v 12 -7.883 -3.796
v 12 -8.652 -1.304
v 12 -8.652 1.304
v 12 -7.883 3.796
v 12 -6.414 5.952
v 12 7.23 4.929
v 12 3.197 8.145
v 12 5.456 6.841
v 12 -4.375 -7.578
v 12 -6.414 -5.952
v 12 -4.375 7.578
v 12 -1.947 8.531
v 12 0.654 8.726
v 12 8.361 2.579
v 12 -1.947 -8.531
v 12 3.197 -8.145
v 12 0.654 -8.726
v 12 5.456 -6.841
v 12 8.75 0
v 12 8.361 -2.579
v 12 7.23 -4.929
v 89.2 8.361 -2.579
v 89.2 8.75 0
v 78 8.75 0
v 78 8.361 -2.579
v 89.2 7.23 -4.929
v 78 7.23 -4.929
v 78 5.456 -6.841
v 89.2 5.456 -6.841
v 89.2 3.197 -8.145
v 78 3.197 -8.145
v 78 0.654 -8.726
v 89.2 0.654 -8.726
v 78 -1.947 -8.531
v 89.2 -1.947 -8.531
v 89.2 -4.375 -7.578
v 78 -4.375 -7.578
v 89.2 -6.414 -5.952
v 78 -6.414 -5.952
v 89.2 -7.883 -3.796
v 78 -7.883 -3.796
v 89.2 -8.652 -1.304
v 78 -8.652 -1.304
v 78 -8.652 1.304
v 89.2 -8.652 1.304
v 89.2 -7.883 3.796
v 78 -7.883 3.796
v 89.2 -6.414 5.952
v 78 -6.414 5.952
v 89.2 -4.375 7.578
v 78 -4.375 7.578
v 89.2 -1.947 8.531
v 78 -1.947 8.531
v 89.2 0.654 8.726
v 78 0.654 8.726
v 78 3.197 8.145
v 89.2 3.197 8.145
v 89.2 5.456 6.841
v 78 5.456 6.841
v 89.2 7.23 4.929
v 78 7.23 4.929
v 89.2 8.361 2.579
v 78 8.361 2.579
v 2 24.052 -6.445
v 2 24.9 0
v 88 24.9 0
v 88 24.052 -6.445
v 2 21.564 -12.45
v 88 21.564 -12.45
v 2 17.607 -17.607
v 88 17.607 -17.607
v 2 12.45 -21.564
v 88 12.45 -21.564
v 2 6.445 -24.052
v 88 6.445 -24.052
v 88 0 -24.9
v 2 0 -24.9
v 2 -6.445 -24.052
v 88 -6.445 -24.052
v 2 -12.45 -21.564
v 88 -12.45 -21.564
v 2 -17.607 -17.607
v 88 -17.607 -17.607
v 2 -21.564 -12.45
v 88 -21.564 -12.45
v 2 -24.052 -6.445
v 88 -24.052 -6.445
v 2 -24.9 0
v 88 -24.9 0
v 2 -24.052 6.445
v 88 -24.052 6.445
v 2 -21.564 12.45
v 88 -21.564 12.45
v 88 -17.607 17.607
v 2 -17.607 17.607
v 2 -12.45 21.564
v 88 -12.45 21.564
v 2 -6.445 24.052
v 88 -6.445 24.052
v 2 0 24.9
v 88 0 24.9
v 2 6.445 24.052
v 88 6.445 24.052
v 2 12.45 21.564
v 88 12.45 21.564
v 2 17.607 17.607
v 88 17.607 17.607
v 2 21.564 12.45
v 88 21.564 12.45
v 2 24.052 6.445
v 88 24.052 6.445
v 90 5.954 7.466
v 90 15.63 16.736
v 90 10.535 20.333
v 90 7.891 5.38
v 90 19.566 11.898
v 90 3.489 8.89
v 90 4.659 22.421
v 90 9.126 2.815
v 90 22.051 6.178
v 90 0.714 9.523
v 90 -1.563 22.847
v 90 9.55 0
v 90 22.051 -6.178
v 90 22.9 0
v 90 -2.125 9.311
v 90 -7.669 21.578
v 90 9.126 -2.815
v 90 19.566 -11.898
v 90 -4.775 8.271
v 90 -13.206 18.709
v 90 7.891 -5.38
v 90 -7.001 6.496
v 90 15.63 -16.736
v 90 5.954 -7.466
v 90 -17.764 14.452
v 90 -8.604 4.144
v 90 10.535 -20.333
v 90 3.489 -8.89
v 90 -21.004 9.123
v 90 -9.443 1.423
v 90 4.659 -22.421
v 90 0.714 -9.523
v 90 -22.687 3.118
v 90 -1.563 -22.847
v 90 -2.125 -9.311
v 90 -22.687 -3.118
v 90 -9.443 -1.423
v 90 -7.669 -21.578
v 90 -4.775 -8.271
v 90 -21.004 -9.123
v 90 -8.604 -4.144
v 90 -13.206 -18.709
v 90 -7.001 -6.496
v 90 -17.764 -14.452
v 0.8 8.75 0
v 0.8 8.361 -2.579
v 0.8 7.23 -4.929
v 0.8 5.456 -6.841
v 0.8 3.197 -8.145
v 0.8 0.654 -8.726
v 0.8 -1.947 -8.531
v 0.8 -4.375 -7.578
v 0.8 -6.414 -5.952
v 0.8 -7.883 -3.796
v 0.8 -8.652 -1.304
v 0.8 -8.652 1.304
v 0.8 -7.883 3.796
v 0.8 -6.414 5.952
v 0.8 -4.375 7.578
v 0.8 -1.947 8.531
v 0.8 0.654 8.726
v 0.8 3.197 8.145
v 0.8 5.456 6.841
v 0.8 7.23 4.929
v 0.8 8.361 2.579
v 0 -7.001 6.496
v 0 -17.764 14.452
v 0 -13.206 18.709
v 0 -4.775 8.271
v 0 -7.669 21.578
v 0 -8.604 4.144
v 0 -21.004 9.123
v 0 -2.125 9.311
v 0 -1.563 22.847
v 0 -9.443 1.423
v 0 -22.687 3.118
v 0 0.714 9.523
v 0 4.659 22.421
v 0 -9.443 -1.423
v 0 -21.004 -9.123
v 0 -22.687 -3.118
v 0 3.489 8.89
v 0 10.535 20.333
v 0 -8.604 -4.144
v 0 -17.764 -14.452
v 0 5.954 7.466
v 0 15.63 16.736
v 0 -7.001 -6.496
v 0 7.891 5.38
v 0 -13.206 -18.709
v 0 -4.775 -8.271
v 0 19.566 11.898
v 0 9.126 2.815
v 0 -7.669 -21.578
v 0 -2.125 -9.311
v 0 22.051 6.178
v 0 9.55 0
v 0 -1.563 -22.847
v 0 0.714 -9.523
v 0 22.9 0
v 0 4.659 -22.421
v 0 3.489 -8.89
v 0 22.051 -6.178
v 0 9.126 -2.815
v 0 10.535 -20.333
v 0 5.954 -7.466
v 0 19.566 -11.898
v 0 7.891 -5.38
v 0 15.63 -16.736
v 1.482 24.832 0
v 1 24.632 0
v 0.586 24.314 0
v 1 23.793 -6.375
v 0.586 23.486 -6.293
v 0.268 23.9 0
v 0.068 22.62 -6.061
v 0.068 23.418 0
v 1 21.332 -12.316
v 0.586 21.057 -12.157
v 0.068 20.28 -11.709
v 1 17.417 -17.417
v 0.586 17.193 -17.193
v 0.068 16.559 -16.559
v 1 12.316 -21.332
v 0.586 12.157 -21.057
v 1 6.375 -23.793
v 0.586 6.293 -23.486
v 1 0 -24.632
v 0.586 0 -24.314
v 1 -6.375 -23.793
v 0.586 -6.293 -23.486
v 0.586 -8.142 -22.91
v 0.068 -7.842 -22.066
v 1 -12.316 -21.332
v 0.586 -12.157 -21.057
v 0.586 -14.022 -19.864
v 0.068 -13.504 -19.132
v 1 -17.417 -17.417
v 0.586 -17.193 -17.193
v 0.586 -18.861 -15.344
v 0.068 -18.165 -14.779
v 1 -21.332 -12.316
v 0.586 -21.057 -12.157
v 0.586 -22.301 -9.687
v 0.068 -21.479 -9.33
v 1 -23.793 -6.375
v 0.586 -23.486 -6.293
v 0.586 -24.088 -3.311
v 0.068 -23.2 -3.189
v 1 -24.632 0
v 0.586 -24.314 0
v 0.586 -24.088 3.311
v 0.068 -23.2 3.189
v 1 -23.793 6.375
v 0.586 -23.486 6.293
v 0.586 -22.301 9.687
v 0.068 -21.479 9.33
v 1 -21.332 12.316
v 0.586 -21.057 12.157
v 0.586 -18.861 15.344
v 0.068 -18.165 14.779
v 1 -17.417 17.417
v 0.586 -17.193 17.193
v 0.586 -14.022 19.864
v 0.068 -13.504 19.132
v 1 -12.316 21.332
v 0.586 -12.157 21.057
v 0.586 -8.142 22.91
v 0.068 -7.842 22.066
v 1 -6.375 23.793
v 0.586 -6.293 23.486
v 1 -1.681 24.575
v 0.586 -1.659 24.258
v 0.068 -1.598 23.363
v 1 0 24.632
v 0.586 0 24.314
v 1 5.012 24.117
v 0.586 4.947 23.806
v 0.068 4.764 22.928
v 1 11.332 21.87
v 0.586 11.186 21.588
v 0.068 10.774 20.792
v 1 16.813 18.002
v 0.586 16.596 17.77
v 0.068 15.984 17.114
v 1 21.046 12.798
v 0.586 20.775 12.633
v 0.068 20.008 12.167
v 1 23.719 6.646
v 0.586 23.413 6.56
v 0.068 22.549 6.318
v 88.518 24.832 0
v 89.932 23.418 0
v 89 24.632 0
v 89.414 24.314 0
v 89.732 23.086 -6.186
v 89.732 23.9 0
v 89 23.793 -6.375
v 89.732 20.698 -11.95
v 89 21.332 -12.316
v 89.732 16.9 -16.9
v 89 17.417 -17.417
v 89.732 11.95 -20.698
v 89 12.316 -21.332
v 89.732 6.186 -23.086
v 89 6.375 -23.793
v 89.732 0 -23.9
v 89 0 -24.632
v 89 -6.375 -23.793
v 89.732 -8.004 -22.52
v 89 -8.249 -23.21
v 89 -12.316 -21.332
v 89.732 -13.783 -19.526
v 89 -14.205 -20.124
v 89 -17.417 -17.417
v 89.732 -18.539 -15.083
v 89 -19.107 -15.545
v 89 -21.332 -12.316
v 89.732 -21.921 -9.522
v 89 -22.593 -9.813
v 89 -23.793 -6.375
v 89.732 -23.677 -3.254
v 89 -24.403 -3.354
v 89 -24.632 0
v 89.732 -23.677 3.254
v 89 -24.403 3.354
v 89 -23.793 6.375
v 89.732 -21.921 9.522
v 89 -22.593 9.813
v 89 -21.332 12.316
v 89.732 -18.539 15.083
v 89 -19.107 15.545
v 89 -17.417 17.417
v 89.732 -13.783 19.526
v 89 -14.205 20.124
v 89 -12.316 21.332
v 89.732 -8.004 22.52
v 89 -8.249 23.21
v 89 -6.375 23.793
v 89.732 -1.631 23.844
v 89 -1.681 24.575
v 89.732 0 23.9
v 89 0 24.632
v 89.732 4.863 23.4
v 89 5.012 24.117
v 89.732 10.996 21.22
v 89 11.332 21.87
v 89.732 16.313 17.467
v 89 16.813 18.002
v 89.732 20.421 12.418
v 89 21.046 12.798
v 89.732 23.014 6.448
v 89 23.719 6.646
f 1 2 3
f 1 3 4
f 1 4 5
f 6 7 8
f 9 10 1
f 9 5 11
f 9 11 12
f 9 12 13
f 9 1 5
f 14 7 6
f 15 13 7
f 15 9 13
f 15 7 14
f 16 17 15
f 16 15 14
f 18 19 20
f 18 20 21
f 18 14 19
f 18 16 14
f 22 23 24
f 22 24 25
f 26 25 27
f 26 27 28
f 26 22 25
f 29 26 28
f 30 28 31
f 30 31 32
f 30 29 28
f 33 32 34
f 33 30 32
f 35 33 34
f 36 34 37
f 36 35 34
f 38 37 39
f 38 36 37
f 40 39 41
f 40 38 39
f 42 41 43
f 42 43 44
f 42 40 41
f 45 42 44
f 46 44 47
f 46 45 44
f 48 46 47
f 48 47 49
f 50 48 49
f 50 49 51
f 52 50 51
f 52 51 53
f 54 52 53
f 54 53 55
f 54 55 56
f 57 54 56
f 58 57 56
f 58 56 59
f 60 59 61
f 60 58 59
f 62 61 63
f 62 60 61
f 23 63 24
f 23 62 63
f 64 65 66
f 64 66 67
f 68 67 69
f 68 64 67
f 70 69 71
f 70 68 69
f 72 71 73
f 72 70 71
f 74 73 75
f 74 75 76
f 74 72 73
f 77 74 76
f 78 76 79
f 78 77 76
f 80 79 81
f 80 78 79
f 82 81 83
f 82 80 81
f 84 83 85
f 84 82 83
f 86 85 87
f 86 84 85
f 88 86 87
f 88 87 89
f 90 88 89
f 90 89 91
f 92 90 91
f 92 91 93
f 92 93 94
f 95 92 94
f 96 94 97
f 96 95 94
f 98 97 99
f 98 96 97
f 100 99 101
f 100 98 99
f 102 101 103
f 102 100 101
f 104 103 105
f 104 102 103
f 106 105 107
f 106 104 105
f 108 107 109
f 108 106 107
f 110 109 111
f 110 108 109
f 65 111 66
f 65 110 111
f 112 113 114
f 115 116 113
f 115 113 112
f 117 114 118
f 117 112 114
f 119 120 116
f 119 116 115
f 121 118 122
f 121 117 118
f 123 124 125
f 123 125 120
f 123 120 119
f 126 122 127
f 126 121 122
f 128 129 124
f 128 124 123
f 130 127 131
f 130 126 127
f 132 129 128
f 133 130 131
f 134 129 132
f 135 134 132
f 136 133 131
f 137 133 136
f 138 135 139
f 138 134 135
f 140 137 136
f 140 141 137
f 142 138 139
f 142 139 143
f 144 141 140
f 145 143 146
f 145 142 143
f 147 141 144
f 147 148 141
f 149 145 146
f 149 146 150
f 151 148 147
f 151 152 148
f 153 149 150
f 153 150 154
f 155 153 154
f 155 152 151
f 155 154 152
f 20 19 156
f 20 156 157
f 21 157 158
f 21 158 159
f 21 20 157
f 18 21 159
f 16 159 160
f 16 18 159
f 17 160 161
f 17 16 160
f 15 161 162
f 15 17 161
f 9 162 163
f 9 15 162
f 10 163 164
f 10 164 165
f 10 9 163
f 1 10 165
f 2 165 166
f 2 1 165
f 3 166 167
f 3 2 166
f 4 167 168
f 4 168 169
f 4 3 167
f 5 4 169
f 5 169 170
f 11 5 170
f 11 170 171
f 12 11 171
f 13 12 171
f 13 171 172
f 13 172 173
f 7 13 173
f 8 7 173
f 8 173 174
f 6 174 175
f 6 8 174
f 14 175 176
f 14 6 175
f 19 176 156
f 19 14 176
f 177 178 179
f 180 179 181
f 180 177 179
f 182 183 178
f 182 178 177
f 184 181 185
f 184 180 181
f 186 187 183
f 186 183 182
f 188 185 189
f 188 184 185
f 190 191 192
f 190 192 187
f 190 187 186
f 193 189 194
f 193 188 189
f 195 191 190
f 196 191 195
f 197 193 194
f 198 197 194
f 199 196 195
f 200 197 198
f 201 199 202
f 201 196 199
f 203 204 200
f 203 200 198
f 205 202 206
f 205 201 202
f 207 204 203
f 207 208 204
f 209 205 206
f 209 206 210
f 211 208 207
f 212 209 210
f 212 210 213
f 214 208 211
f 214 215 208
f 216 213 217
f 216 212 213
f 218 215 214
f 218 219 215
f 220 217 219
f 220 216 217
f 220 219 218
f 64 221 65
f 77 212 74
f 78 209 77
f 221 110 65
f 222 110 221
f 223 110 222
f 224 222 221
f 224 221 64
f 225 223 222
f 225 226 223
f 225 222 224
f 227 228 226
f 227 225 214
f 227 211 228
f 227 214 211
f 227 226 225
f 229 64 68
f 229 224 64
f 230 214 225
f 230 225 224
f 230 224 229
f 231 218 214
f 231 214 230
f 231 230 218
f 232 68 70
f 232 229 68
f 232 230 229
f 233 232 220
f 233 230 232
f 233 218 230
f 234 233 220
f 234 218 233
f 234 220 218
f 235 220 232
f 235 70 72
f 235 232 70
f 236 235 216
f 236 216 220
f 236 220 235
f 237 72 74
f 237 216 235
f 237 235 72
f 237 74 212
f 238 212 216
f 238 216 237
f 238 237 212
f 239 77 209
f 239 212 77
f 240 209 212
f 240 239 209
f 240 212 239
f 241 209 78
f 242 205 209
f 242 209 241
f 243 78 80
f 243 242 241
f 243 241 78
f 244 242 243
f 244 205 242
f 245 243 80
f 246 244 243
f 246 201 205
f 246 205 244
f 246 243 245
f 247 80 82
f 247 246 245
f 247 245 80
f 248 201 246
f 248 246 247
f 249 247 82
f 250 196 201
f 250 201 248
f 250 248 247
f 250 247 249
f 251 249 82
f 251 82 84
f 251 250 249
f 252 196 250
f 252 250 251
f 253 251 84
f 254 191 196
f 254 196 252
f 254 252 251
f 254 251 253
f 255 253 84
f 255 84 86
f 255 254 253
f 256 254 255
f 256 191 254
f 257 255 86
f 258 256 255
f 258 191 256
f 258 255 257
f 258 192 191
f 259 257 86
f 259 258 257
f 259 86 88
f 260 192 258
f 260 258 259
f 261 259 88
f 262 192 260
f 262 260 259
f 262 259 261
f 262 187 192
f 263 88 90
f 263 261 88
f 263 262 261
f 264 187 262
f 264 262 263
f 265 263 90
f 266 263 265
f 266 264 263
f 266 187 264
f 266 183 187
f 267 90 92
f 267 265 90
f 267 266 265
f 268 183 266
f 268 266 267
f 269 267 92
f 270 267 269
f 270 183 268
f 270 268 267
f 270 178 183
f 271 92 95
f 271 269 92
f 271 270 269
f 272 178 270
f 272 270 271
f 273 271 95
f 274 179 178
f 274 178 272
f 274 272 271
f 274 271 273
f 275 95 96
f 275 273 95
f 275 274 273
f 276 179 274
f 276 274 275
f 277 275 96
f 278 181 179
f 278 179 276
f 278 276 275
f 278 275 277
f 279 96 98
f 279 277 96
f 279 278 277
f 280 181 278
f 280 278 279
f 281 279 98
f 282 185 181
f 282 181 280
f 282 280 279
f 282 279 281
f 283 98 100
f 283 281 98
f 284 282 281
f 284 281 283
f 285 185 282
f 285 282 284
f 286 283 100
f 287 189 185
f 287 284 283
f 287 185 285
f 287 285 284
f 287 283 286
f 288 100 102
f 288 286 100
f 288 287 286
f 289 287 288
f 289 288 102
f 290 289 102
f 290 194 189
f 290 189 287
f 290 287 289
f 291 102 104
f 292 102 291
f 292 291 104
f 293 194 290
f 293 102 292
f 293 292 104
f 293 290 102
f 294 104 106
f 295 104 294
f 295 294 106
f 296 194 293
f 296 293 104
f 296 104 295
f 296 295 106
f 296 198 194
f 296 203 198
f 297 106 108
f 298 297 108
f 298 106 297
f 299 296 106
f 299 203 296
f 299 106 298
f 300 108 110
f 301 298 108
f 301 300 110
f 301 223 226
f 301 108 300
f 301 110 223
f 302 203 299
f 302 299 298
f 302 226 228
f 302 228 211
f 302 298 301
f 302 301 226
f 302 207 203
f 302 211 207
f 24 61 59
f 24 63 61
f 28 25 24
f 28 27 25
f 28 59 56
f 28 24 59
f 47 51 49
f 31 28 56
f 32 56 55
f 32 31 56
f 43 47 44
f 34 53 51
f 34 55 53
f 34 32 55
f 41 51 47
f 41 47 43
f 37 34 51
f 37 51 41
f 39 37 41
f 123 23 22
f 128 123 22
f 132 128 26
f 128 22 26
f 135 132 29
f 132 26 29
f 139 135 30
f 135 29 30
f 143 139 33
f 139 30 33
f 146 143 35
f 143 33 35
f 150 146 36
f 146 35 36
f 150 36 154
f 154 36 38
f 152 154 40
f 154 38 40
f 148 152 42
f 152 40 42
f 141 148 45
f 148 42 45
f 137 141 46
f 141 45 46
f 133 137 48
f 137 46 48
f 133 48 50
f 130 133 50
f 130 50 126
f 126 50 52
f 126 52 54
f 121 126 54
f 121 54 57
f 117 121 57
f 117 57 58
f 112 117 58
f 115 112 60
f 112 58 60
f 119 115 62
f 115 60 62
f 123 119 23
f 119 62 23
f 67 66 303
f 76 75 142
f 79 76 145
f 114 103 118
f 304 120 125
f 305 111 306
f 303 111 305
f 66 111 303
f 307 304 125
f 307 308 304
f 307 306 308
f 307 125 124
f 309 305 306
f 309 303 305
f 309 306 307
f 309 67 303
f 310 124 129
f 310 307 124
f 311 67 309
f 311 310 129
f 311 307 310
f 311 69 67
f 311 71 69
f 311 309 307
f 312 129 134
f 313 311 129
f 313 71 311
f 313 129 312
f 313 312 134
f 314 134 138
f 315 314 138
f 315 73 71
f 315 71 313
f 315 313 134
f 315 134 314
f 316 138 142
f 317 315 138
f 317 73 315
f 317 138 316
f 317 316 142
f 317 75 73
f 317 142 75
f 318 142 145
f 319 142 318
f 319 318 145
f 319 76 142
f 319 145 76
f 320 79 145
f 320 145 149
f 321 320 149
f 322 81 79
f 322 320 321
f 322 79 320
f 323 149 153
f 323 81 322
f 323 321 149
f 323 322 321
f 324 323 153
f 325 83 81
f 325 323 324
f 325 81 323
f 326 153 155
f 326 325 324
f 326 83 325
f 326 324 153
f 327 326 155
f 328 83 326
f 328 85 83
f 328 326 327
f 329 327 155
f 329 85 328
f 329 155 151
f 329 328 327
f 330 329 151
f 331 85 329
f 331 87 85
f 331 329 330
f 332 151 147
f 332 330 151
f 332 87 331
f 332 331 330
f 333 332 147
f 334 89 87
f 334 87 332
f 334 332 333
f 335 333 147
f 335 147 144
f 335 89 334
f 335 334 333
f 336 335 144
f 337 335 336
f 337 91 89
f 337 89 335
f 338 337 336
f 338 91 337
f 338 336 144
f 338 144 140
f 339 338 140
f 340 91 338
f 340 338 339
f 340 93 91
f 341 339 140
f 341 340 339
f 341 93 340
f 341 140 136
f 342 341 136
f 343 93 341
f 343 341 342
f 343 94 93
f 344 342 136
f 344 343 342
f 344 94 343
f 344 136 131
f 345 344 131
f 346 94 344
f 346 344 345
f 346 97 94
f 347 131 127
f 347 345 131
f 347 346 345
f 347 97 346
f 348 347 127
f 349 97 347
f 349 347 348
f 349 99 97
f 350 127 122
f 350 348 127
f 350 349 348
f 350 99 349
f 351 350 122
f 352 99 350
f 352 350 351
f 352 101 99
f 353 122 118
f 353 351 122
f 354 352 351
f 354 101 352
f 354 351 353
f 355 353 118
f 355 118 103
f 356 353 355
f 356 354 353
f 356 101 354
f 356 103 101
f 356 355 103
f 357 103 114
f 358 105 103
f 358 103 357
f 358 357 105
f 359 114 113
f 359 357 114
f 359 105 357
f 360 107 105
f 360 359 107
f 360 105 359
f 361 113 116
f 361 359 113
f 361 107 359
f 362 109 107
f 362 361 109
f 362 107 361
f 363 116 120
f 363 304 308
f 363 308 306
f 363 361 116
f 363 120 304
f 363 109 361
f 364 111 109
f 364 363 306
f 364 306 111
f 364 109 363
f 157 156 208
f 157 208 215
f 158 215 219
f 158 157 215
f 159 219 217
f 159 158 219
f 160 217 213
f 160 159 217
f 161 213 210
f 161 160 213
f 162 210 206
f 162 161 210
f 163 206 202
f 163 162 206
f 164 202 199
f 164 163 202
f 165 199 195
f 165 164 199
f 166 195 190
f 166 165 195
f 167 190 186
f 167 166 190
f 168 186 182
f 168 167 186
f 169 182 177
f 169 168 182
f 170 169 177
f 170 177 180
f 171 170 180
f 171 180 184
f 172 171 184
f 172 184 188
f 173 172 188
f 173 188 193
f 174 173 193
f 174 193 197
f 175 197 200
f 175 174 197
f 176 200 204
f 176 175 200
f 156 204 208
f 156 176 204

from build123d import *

# Parameters (mm, degrees)
F2_R    = 2
F3_SIZE = 0.8


with BuildPart() as f1:
    # F0 (on Top) → F1 (revolve)
    with BuildSketch(Plane.XY):
        Polygon((12, 8.75), (12, 0), (78, 0), (78, 8.75), (90, 8.75), (90, 24.9), (0, 24.9), (0, 8.75), align=None)
    revolve(axis=Axis((45, 0, 0), (-1, 0, 0)))

    # F2
    f2_edges = [f1.edges().sort_by_distance(p)[0] for p in [
        (0, -24.9, 0),
        (90, -24.9, 0),
    ]]
    fillet(f2_edges, radius=F2_R)

    # F3
    f3_edges = [f1.edges().sort_by_distance(p)[0] for p in [
        (0, -8.75, 0),
        (90, -8.75, 0),
    ]]
    chamfer(f3_edges, length=F3_SIZE)


solid = f1.part
